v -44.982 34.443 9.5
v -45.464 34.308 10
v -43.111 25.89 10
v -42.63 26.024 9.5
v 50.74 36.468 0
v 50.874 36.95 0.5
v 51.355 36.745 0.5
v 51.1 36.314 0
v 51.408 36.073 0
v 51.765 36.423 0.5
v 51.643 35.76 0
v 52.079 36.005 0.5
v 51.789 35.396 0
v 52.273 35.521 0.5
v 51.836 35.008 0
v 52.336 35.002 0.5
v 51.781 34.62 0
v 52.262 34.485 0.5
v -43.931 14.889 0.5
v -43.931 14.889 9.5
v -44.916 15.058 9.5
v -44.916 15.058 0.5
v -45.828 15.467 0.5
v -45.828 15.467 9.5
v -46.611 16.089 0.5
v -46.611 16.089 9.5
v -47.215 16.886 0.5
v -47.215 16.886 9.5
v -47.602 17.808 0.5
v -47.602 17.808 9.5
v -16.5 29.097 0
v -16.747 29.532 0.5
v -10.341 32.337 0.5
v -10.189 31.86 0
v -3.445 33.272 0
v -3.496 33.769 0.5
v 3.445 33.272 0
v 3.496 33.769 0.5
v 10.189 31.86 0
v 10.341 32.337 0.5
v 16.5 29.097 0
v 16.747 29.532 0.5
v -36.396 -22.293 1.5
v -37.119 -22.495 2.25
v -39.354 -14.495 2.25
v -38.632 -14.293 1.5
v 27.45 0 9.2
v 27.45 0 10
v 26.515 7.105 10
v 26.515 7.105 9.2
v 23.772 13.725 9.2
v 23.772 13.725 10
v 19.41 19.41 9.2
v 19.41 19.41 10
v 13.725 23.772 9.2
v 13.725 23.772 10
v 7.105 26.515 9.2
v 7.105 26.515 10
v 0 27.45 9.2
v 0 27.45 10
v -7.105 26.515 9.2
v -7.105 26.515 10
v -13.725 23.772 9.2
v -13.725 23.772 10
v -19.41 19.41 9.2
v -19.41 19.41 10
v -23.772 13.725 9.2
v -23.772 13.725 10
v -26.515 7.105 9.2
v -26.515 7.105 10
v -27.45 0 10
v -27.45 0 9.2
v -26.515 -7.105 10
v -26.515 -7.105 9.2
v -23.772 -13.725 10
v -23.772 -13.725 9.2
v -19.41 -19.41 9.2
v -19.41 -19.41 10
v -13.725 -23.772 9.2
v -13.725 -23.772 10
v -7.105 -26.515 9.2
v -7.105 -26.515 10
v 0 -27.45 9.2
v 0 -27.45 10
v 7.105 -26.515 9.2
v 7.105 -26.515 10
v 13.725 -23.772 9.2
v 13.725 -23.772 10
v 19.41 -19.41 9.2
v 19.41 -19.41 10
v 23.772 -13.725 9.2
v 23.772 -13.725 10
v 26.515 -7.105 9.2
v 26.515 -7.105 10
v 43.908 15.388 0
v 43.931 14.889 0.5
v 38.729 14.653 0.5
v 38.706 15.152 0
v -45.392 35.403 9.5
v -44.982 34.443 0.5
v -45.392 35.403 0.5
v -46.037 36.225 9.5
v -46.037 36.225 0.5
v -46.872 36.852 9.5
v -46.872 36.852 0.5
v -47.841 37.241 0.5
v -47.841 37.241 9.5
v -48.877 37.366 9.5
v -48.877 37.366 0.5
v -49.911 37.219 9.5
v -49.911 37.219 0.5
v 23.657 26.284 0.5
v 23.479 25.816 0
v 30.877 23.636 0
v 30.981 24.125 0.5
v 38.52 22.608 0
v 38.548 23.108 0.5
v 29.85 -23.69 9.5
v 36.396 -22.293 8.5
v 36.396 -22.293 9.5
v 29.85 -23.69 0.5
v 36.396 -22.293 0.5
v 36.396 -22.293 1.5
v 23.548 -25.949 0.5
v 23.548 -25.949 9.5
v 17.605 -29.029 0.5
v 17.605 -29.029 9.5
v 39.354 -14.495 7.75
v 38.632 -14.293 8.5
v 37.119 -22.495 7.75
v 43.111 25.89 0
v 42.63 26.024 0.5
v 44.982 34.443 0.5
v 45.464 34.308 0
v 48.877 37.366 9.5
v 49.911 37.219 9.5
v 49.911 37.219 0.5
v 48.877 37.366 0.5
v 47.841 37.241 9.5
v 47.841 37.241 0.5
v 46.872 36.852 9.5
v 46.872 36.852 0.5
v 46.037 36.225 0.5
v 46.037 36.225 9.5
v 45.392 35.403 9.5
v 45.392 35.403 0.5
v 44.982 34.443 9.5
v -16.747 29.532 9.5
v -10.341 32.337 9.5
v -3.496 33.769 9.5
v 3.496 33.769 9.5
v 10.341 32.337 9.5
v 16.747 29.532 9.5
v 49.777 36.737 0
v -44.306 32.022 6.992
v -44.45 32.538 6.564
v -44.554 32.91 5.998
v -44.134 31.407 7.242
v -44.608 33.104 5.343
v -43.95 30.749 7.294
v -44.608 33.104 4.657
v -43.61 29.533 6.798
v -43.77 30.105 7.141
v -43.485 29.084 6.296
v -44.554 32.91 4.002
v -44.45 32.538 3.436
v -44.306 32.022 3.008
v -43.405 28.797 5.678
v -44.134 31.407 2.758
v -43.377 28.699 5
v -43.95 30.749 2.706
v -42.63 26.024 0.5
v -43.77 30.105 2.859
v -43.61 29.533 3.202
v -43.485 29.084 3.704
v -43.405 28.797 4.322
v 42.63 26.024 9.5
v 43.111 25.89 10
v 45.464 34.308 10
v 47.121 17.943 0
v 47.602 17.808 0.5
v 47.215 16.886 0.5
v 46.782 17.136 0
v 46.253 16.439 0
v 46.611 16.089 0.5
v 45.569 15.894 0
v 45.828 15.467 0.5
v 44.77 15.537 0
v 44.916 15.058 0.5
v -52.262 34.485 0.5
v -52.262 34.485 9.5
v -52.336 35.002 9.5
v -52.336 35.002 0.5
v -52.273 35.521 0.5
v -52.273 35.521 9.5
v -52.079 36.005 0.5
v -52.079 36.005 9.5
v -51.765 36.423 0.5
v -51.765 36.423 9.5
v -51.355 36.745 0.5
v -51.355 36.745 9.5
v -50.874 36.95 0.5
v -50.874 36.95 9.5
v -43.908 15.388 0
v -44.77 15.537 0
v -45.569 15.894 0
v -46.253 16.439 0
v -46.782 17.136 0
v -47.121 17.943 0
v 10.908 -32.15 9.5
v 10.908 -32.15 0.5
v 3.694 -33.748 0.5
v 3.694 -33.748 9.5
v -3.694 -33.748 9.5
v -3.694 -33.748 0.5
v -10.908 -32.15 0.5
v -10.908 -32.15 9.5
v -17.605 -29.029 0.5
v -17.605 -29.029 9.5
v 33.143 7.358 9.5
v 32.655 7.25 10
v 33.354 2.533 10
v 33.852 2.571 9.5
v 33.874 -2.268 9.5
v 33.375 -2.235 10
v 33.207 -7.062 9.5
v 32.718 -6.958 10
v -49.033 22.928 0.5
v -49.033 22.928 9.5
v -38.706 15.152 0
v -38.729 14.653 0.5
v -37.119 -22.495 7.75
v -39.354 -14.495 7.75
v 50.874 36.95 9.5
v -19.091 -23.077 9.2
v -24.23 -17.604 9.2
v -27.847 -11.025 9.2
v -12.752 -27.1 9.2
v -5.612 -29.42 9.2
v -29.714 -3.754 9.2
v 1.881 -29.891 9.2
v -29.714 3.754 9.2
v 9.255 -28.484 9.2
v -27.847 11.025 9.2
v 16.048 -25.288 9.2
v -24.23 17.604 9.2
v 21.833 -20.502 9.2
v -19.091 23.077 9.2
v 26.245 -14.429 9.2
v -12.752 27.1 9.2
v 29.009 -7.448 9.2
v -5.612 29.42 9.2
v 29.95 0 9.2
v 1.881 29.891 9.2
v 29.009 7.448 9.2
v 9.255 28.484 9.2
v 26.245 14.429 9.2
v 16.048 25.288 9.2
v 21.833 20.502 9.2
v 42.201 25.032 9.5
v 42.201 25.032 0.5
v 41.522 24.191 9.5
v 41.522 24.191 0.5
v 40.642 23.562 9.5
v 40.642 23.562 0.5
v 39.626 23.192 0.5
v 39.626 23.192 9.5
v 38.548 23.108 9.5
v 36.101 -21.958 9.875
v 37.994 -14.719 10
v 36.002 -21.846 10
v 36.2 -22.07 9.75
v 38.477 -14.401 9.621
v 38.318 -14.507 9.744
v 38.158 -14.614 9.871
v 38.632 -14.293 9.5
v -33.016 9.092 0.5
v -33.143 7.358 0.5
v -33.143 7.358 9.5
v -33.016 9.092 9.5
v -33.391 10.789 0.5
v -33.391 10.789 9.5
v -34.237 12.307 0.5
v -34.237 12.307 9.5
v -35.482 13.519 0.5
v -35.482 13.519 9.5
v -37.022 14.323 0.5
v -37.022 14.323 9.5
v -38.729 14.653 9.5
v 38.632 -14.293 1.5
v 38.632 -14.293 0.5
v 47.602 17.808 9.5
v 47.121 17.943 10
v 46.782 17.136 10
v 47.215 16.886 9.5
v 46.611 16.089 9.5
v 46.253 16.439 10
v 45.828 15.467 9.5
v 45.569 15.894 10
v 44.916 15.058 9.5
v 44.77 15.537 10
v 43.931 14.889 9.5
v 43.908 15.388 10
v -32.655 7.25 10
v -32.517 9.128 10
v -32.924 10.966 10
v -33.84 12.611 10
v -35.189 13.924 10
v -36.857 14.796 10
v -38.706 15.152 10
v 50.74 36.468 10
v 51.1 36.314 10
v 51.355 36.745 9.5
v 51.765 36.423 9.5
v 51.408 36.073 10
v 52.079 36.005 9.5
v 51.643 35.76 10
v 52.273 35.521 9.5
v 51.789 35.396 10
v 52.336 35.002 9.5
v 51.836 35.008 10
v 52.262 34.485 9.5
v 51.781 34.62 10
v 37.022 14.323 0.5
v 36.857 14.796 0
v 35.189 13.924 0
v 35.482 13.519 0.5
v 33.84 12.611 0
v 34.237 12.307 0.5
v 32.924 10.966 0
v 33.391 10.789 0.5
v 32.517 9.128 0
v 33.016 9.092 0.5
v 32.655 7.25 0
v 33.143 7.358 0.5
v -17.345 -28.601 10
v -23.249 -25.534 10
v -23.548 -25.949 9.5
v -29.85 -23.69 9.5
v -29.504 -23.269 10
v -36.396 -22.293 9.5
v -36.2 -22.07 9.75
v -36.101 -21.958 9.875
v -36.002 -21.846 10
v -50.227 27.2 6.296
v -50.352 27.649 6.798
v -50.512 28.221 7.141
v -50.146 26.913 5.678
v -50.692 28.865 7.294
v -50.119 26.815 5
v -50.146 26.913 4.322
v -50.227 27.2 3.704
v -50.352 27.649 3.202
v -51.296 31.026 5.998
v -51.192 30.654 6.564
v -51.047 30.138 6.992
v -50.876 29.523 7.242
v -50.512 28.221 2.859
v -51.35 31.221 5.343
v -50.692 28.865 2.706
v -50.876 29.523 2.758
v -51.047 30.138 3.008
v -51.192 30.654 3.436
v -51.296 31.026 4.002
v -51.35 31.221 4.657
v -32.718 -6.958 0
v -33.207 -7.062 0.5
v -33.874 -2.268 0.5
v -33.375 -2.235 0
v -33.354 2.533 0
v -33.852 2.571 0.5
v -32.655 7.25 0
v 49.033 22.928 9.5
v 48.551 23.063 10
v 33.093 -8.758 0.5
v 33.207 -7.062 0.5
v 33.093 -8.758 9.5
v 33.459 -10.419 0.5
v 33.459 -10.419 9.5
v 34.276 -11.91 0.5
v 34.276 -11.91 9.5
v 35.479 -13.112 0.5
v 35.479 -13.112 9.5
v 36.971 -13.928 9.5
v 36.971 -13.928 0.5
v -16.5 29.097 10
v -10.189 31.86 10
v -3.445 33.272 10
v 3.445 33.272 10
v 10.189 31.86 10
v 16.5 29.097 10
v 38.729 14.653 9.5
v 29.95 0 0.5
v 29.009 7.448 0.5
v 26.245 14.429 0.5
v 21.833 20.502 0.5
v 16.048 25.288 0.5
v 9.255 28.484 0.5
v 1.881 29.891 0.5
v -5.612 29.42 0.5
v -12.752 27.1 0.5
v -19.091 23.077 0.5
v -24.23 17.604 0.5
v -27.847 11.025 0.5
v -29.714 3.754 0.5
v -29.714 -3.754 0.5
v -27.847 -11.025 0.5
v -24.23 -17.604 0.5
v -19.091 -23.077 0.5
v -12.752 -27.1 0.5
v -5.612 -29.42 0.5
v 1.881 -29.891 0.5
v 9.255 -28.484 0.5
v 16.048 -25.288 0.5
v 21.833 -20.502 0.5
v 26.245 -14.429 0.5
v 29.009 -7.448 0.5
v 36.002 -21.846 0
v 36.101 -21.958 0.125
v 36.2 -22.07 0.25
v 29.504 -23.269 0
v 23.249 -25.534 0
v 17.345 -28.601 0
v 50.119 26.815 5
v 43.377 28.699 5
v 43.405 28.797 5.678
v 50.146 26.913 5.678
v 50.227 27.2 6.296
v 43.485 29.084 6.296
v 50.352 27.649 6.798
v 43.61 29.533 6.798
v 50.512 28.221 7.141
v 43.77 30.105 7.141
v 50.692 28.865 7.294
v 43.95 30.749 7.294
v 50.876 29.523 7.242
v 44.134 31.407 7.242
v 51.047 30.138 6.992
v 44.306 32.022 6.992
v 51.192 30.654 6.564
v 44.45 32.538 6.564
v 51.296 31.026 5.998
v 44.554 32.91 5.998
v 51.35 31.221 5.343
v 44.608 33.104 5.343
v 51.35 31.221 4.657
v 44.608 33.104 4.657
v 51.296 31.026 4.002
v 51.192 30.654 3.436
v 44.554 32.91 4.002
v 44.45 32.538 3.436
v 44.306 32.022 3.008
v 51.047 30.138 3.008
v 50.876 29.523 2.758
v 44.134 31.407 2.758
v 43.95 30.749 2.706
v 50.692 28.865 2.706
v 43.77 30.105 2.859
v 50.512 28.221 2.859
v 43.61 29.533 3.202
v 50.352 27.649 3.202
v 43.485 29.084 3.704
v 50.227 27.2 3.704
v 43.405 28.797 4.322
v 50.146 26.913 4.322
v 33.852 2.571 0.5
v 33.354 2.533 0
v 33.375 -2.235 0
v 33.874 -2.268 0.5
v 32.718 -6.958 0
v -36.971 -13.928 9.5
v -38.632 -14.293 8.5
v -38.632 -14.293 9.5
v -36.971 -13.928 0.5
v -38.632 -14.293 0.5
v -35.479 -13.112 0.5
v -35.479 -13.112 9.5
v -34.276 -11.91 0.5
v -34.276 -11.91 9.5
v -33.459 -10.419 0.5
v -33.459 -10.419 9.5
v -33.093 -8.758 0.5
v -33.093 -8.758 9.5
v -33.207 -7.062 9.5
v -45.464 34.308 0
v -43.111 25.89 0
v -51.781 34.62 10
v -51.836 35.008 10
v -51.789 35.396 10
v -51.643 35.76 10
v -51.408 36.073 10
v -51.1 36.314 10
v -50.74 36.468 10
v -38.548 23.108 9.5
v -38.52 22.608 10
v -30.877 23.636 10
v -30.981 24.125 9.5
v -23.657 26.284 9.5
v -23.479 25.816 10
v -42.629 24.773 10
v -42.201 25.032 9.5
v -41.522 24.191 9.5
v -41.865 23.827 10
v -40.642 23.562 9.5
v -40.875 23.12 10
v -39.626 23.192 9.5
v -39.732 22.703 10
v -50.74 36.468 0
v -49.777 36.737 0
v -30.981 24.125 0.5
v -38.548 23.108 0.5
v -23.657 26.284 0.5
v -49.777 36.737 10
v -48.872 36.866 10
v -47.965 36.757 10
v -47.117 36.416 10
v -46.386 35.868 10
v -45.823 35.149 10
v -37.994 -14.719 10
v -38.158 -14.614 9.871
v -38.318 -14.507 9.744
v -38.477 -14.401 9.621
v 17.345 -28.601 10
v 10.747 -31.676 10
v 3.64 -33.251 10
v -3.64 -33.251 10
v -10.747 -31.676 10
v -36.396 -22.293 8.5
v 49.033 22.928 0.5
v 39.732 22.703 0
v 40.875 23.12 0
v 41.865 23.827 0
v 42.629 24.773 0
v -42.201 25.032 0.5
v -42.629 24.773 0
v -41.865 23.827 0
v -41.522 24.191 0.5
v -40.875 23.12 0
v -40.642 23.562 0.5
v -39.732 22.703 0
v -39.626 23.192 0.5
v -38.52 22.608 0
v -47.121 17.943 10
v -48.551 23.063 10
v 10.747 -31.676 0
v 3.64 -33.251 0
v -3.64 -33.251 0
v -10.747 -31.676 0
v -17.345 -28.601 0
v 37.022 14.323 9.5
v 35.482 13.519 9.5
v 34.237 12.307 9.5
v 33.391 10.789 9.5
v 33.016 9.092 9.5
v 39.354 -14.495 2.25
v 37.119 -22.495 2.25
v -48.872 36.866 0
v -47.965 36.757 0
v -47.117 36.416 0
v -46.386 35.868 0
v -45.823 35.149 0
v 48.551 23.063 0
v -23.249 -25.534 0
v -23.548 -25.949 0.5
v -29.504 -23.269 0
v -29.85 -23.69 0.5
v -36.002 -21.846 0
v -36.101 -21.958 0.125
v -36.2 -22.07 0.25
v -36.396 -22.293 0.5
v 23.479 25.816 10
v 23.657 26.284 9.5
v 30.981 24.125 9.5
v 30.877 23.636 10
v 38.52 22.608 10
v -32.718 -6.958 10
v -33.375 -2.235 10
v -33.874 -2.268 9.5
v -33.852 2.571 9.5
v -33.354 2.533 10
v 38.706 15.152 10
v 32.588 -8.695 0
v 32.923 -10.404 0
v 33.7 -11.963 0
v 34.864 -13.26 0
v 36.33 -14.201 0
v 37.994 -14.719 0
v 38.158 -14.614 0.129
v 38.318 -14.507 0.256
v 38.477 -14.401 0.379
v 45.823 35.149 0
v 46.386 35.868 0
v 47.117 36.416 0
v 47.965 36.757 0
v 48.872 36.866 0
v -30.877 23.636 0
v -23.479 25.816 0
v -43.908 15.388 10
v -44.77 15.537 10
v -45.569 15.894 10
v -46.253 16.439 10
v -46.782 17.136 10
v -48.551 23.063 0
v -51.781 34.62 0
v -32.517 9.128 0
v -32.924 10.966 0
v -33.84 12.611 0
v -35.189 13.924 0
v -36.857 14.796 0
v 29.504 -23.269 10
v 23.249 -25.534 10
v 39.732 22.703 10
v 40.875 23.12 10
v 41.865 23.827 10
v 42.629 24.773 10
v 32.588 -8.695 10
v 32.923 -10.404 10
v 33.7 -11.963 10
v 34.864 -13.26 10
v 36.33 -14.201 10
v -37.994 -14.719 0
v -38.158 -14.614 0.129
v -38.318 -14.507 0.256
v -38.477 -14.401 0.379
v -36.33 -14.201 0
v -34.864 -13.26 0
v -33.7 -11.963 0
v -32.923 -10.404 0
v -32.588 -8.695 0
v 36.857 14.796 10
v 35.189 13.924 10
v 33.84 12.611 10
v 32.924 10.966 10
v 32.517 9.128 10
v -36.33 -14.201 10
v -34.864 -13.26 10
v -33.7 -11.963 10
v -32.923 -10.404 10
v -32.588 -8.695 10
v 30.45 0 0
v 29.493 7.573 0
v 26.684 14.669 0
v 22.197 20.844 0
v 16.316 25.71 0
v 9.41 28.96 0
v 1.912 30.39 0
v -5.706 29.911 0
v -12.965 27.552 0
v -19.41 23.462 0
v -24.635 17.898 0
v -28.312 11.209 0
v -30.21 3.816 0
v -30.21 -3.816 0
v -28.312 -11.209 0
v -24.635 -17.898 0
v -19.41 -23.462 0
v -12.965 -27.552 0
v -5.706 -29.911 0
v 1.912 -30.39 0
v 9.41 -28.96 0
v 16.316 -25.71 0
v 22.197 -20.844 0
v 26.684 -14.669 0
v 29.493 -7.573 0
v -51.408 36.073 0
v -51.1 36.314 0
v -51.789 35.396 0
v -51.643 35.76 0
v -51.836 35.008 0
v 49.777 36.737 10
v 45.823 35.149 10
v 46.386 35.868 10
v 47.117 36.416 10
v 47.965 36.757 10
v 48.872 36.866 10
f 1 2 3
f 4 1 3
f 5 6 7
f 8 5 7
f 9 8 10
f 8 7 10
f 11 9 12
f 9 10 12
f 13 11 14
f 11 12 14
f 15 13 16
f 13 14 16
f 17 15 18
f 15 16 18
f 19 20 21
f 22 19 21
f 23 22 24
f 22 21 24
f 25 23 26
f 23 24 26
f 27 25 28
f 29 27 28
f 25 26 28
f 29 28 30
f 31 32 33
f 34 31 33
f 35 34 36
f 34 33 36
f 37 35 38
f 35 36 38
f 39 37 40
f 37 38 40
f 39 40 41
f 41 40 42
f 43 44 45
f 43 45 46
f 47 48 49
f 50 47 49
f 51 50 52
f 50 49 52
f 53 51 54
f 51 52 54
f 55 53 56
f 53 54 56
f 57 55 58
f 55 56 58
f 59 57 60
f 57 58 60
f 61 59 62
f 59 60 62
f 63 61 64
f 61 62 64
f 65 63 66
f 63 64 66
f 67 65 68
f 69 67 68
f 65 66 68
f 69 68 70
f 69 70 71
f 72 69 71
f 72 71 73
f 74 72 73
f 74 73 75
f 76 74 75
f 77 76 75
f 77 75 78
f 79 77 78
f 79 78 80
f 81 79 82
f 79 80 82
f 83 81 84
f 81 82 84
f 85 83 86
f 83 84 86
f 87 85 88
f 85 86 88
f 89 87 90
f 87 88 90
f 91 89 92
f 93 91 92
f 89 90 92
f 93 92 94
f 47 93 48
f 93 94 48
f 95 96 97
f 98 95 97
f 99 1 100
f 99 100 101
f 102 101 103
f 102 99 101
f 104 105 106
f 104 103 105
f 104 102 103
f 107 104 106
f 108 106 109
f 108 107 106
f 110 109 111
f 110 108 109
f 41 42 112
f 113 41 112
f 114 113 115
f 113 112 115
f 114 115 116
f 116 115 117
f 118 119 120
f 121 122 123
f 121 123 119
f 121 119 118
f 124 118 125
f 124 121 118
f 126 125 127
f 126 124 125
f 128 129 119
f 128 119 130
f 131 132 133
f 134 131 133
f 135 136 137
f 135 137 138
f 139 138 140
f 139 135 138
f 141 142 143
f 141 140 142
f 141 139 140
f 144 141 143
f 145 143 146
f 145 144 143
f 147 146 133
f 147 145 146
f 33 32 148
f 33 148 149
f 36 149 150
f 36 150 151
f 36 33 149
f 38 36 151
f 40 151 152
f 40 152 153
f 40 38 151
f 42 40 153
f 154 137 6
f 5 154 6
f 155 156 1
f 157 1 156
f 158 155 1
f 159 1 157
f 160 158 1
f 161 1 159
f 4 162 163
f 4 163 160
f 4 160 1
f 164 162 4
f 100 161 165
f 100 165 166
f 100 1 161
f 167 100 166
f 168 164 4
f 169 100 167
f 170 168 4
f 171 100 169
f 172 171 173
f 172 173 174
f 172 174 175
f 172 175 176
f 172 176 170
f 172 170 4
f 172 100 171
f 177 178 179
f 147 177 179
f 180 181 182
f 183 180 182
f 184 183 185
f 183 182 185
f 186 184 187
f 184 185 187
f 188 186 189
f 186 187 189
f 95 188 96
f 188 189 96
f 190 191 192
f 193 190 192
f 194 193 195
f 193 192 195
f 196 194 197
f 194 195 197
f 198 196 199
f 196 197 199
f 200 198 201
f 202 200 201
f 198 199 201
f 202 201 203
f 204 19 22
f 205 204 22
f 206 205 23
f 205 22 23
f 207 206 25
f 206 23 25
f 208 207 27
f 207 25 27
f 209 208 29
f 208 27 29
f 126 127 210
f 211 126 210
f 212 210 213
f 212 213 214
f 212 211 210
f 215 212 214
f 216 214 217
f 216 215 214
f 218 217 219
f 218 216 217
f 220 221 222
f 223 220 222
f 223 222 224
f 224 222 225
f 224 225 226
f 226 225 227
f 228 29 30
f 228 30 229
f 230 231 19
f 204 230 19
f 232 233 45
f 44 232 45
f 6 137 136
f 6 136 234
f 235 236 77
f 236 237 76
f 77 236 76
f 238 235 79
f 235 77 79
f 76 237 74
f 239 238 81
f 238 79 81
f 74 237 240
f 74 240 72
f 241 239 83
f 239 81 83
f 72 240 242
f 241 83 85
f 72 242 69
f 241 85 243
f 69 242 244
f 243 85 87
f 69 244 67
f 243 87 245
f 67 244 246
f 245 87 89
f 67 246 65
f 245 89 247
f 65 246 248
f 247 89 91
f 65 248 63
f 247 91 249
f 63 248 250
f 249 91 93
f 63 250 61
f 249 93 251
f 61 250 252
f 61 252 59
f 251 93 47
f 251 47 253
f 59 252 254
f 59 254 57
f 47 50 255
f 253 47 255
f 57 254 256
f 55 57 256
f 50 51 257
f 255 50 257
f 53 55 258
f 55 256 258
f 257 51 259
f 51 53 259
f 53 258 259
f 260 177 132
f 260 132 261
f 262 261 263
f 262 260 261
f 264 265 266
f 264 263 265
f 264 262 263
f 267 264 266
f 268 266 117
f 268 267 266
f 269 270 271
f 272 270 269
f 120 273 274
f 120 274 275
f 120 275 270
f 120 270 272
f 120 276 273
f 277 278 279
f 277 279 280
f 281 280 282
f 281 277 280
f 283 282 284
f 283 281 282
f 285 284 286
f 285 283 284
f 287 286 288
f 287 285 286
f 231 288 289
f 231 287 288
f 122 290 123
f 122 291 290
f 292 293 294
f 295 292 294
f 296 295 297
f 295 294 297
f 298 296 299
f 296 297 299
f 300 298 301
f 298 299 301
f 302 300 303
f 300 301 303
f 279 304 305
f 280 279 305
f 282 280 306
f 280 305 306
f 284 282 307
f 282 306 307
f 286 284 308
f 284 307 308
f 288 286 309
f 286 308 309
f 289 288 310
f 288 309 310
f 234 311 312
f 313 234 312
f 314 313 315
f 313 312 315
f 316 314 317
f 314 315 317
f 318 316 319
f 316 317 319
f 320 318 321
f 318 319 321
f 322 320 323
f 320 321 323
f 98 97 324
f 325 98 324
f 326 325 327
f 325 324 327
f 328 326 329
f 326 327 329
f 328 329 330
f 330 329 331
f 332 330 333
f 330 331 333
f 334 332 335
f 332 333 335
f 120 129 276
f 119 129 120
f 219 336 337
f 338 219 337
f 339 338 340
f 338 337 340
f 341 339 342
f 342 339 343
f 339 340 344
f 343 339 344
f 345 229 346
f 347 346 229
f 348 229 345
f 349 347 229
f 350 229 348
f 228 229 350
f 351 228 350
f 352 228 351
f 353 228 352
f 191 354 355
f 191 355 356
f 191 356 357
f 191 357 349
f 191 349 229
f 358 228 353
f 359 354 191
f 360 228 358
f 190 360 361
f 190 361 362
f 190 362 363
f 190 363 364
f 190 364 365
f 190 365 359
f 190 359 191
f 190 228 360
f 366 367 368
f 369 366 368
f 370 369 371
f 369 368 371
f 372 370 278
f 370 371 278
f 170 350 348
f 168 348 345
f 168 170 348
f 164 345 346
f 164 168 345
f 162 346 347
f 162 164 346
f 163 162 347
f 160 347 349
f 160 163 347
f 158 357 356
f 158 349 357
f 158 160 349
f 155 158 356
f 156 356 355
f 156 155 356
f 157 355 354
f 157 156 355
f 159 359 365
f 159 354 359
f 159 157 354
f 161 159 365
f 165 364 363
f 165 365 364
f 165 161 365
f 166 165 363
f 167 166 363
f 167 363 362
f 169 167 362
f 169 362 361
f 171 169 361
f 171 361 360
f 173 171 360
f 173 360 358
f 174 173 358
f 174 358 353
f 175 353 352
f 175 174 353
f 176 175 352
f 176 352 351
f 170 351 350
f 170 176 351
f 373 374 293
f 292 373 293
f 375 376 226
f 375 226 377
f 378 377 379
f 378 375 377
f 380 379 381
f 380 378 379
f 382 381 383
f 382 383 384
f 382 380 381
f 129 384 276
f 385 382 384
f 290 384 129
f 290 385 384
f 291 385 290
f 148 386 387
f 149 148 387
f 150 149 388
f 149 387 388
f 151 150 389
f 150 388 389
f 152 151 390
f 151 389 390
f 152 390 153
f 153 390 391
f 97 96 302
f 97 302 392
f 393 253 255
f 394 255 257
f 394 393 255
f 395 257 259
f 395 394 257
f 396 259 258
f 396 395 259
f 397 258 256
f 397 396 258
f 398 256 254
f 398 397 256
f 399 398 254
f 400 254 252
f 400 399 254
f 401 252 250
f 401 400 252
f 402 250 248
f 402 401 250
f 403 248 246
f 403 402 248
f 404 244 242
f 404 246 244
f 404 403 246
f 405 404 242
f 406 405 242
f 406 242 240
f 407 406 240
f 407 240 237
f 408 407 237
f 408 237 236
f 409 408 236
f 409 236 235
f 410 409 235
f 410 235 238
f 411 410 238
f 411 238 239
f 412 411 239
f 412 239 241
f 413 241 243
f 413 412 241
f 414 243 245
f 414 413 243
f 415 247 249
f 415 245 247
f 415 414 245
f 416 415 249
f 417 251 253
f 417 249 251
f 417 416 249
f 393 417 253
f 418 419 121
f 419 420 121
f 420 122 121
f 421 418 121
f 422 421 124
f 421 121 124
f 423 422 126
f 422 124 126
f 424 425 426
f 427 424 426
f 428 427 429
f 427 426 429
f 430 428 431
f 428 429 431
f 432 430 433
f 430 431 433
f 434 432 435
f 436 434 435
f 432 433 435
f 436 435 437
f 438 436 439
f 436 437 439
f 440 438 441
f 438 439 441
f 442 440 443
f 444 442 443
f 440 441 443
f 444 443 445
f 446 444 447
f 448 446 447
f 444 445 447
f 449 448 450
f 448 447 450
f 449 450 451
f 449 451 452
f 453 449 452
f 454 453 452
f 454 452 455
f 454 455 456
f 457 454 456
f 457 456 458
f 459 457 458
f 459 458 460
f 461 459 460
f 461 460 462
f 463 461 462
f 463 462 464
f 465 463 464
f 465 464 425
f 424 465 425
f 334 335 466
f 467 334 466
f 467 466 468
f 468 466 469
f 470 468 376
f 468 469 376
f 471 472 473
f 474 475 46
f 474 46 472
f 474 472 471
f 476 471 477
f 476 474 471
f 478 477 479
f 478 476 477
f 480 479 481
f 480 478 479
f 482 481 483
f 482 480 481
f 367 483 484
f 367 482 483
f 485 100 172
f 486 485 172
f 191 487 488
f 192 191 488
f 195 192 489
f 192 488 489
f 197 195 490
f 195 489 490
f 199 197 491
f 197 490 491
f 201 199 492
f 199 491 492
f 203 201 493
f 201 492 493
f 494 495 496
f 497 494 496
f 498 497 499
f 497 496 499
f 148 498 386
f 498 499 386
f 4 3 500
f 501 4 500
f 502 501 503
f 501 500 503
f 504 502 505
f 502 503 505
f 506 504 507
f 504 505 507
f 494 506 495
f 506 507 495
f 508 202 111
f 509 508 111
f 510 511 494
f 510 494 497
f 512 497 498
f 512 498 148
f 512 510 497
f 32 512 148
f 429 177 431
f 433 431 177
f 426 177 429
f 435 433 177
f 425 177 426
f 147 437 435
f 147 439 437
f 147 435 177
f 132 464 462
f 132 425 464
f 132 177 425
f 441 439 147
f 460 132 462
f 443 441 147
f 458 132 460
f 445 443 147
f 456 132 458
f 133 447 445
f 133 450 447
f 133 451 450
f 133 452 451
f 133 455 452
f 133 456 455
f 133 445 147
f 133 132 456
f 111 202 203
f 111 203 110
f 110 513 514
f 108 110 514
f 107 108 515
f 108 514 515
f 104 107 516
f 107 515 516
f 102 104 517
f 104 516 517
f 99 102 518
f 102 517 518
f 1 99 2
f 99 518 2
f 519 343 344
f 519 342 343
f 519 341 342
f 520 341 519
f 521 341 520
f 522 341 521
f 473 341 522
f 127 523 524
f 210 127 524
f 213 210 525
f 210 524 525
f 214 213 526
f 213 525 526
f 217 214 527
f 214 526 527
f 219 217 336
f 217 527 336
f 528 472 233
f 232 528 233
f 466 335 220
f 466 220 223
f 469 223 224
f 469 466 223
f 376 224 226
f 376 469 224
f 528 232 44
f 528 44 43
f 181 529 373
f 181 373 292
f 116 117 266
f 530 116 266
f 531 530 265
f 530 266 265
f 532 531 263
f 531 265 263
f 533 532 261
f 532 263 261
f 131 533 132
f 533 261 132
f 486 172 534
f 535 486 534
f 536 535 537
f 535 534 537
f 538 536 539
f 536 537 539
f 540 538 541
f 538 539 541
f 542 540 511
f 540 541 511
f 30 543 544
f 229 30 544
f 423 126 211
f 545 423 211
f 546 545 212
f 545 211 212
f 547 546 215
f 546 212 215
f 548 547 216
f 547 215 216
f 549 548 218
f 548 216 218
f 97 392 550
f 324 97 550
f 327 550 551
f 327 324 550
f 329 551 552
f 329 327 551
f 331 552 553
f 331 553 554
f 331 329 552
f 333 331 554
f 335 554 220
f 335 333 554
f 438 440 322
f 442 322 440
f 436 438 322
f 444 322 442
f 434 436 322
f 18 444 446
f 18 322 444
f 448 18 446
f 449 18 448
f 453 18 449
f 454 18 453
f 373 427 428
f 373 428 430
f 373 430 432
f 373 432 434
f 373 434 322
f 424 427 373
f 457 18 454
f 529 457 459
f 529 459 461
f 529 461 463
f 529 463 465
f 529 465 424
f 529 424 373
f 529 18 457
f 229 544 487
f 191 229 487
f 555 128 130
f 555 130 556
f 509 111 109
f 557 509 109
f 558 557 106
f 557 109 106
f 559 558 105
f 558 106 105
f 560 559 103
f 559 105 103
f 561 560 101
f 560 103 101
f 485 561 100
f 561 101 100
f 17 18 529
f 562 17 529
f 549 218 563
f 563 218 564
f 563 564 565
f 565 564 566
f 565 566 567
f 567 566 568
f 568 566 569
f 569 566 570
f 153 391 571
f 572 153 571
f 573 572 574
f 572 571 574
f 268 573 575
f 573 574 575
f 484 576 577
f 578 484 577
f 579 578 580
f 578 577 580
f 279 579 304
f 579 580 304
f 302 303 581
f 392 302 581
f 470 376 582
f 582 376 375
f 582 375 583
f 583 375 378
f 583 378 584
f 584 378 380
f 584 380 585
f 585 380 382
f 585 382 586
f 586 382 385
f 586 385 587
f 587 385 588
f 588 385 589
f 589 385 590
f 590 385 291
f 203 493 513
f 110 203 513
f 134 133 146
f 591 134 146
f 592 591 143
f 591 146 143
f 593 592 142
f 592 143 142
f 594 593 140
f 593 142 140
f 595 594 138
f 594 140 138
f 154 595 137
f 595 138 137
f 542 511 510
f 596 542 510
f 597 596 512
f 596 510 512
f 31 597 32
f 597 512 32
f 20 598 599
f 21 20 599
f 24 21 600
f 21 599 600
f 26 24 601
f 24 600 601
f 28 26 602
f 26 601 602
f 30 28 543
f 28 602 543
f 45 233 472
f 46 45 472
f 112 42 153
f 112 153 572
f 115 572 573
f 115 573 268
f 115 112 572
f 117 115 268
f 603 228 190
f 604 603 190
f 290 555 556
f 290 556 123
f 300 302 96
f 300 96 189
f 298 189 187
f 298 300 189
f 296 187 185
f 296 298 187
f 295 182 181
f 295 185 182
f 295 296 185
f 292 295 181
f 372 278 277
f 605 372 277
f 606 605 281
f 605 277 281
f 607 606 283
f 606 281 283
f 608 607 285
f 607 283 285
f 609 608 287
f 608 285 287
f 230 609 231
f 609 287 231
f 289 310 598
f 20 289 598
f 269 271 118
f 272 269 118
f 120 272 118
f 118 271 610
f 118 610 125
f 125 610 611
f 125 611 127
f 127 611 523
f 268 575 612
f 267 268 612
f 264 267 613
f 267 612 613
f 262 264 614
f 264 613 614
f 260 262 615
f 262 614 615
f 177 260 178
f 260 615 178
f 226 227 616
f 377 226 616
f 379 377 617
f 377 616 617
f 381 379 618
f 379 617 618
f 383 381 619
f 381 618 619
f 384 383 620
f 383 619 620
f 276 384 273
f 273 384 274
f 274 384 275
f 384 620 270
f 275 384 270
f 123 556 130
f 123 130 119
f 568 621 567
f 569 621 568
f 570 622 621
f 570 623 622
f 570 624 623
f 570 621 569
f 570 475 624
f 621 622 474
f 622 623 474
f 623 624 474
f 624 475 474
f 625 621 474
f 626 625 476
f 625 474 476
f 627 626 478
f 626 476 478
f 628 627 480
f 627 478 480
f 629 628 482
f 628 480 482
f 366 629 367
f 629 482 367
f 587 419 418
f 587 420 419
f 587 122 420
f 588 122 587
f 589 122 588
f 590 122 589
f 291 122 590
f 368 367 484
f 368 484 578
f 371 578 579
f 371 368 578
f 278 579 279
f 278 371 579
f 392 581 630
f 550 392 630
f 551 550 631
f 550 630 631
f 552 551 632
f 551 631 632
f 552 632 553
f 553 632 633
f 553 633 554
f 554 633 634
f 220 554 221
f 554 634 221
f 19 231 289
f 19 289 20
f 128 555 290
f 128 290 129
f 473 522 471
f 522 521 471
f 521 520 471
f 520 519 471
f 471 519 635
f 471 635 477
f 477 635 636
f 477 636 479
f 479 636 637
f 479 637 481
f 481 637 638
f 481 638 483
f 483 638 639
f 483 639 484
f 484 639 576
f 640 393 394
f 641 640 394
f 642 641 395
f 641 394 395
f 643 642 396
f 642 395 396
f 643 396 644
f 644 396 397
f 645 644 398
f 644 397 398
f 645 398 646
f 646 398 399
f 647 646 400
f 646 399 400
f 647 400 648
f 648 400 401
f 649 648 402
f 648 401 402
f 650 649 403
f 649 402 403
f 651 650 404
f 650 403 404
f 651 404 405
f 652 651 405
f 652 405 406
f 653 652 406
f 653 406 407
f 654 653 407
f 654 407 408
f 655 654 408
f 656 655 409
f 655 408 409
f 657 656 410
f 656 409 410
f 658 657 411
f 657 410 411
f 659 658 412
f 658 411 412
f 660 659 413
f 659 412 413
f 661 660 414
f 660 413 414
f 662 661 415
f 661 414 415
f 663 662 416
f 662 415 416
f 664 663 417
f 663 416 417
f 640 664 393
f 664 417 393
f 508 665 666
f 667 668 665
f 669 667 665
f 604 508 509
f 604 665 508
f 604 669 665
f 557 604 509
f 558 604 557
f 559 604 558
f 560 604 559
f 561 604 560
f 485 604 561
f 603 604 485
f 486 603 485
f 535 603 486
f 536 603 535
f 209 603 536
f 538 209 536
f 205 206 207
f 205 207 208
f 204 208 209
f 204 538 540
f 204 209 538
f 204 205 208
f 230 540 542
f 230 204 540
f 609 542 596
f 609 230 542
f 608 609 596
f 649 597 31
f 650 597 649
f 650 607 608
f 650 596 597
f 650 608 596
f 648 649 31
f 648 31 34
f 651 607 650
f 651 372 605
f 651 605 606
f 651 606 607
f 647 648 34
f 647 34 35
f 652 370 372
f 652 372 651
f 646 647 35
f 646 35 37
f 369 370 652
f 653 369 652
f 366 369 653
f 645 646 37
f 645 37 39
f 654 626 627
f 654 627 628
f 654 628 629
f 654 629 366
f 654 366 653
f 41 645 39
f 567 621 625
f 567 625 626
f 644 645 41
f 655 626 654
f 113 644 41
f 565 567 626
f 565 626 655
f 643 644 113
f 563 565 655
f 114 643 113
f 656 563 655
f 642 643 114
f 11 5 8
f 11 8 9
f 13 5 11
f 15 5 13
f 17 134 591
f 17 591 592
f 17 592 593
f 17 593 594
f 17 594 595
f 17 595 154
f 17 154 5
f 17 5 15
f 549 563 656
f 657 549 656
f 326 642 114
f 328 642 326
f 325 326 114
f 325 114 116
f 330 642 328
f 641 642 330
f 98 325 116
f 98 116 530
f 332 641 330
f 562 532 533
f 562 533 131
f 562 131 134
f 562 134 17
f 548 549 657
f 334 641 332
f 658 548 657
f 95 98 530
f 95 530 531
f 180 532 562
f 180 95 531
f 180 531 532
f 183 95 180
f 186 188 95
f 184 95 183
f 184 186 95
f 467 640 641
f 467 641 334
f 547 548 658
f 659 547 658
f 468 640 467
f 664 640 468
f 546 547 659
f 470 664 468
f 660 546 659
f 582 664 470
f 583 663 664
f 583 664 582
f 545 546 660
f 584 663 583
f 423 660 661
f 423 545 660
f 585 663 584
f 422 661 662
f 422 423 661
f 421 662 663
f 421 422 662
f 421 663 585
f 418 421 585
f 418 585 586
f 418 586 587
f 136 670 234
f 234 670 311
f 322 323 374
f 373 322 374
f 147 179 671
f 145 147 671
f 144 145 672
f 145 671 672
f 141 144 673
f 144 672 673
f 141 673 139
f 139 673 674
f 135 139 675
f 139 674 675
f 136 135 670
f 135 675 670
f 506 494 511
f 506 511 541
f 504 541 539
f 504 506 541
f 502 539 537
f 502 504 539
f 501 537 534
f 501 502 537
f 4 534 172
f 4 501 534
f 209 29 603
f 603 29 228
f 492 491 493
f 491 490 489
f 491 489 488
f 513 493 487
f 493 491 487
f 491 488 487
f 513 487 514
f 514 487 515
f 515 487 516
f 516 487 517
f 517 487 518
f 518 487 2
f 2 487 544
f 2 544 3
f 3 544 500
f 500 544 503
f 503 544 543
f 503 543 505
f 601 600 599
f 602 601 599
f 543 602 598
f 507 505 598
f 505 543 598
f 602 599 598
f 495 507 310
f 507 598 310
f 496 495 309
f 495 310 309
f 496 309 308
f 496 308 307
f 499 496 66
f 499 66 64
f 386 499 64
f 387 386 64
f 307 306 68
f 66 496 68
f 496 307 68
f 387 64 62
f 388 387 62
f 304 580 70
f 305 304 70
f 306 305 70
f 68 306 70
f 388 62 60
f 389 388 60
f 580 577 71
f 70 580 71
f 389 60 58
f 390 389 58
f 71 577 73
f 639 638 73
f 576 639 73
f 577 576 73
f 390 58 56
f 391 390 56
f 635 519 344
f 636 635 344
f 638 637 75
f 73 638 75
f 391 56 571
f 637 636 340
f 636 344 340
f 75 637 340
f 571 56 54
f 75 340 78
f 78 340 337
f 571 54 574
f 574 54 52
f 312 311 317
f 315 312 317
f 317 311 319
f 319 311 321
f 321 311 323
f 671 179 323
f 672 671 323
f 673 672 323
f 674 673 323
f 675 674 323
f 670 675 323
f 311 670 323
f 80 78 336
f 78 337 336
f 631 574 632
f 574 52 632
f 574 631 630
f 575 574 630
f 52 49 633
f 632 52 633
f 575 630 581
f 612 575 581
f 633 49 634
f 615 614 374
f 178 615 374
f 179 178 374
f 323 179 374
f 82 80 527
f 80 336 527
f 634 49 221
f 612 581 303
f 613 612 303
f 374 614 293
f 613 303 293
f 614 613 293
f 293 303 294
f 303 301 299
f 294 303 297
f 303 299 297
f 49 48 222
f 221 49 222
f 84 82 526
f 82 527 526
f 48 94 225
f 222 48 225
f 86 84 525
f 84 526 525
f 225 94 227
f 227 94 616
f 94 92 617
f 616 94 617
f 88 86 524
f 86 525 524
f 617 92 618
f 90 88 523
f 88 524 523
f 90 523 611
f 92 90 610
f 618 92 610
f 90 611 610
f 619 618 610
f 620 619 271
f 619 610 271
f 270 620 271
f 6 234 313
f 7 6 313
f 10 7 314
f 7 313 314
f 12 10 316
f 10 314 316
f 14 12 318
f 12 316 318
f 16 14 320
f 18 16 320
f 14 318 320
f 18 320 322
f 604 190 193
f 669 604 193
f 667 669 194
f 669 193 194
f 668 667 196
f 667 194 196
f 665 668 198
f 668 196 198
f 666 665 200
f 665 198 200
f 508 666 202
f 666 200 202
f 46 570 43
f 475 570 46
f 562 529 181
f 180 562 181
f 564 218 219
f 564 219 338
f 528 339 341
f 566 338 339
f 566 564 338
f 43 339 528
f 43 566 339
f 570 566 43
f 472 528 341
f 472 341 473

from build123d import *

# Parameters (mm, degrees)
SKIZZE1_R                       = 29.95
AUFSATZ_LINEAR_AUSTRAGEN1_DEPTH = 10
SKIZZE2_R                       = 32.75
SKIZZE2_R_2                     = 27.45
AUFSATZ_LINEAR_AUSTRAGEN2_DEPTH = 0.8
SKIZZE5_R                       = 2.3
SCHNITT_LINEAR_AUSTRAGEN1_DEPTH = 10
VERRUNDUNG1_R                   = 50
VERRUNDUNG2_R                   = 6
VERRUNDUNG3_R                   = 4
AUFSATZ_LINEAR_AUSTRAGEN3_DEPTH = 8.306468
FILLET1_R                       = 2
CHAMFER1_SIZE                   = 0.5


with BuildPart() as part:
    # Skizze1 → Aufsatz-Linear austragen1 (new body)
    with BuildSketch(Plane.XY):
        with BuildLine():
            Line((-25.605118216, -22.29305769), (-36.396367746, -22.29305769))
            Line((-36.396367746, -22.29305769), (-38.631857121, -14.29305769))
            Line((-38.631857121, -14.29305769), (-30.794658658, -14.29305769))
            ThreePointArc((-30.794658658, -14.29305769), (-33.95, 0), (-30.794658658, 14.29305769))
            Line((-30.794658658, 14.29305769), (-46.822915195, 15.019747505))
            Line((-46.822915195, 15.019747505), (-49.03277701, 22.928035825))
            Line((-49.03277701, 22.928035825), (-52.800545787, 36.411504164))
            Line((-52.800545787, 36.411504164), (-46.058811618, 38.295388553))
            Line((-46.058811618, 38.295388553), (-41.792257863, 23.026950955))
            Line((-41.792257863, 23.026950955), (-25.605118216, 22.29305769))
            ThreePointArc((-25.605118216, 22.29305769), (0, 33.95), (25.605118216, 22.29305769))
            Line((25.605118216, 22.29305769), (41.792257863, 23.026950955))
            Line((41.792257863, 23.026950955), (46.058811618, 38.295388553))
            Line((46.058811618, 38.295388553), (52.800545787, 36.411504164))
            Line((52.800545787, 36.411504164), (49.03277701, 22.928035825))
            Line((49.03277701, 22.928035825), (46.822915195, 15.019747505))
            Line((46.822915195, 15.019747505), (30.794658658, 14.29305769))
            ThreePointArc((30.794658658, 14.29305769), (33.95, 0), (30.794658658, -14.29305769))
            Line((30.794658658, -14.29305769), (38.631857121, -14.29305769))
            Line((38.631857121, -14.29305769), (36.396367746, -22.29305769))
            Line((36.396367746, -22.29305769), (25.605118216, -22.29305769))
            ThreePointArc((25.605118216, -22.29305769), (0, -33.95), (-25.605118216, -22.29305769))
        make_face()
        Circle(SKIZZE1_R, mode=Mode.SUBTRACT)
    extrude(amount=AUFSATZ_LINEAR_AUSTRAGEN1_DEPTH)

    # Skizze2 → Aufsatz-Linear austragen2 (add)
    with BuildSketch(Plane.XY.offset(10)):
        Circle(SKIZZE2_R)
        Circle(SKIZZE2_R_2, mode=Mode.SUBTRACT)
    extrude(amount=-AUFSATZ_LINEAR_AUSTRAGEN2_DEPTH)

    # Skizze5 → Schnitt-Linear austragen1 (cut)
    with BuildSketch(Plane(origin=(32.796772797, -9.164604643, 0), x_dir=(0, 0, 1), z_dir=(-0.9631048813334842, 0.2691263412444341, 0))):
        with Locations(Location((5, 41.61405755, 0), (0, 0, 270))):
            Circle(SKIZZE5_R)
    schnitt_linear_austragen1 = extrude(amount=-SCHNITT_LINEAR_AUSTRAGEN1_DEPTH, mode=Mode.SUBTRACT)

    # Spiegeln1: Schnitt-Linear austragen1 across plane
    add(schnitt_linear_austragen1.mirror(Plane(origin=(0, 0, 0), x_dir=(0, 0, 1), z_dir=(1, 0, 0))), mode=Mode.SUBTRACT)

    # Verrundung1
    # the kernel refuses this fillet: 50 mm, written as the material it adds along each edge
    with BuildSketch(Plane(origin=(-25.605118216, 22.29305769, 0), x_dir=(-0.9989738125947814, 0.045291519623947715, 0), z_dir=(0, 0, 1))) as verrundung1_piece_1:
        with BuildLine():
            CenterArc((18.087510266, -49.964502541), VERRUNDUNG1_R, 92.159120897, 29.993366161)
            Line((-8.521208788, -7.632764208), (-9.053383169, -6.786129441))
            ThreePointArc((-9.053383169, -6.786129441), (-4.604005024, -3.433010053), (-0.783167276, 0.621811079))
            Line((-0.783167276, 0.621811079), (0, 1))
            ThreePointArc((0, 1), (8.101883875, 1), (16.1660929, 0.999290051))
            Line((16.1660929, 0.999290051), (16.20376775, 0))
        make_face()
    extrude(amount=10)
    with BuildSketch(Plane(origin=(25.605118216, 22.29305769, 0), x_dir=(-0.7743254156963487, 0.6327876030760059, 0), z_dir=(0, 0, 1))) as verrundung1_piece_2:
        with BuildLine():
            CenterArc((19.863886687, -49.285246753), VERRUNDUNG1_R, 99.699501479, 29.993366161)
            Line((-12.069715077, -10.811293506), (-12.708387112, -10.041814441))
            ThreePointArc((-12.708387112, -10.041814441), (-6.702066157, -4.660775852), (-0.667208619, 0.744870901))
            Line((-0.667208619, 0.744870901), (0.168480803, 0.985704935))
            ThreePointArc((0.168480803, 0.985704935), (5.719923266, 0.514682545), (11.271365728, 0.985704935))
            Line((11.271365728, 0.985704935), (11.439846531, 0))
        make_face()
    extrude(amount=10)
    with BuildSketch(Plane(origin=(-25.605118216, -22.29305769, 0), x_dir=(-1, 0, 0), z_dir=(0, 0, 1))) as verrundung1_piece_3:
        with BuildLine():
            CenterArc((17.927143088, 49.488170537), VERRUNDUNG1_R, 238.764970405, 23.029881184)
            Line((-8.000350244, 6.735801135), (-8.51890011, 5.880753747))
            ThreePointArc((-8.51890011, 5.880753747), (-4.38330809, 2.912839933), (-0.754200831, -0.65664382))
            Line((-0.754200831, -0.65664382), (0, -1))
            ThreePointArc((0, -1), (5.395624765, -1), (10.648531659, -0.989763411))
            Line((10.648531659, -0.989763411), (10.79124953, 0))
        make_face()
    extrude(amount=10)
    with BuildSketch(Plane(origin=(25.605118216, -22.29305769, 0), x_dir=(-0.7649741312009661, -0.6440610053351523, 0), z_dir=(0, 0, 1))) as verrundung1_piece_4:
        with BuildLine():
            CenterArc((18.15960016, 49.403344062), VERRUNDUNG1_R, 238.109839077, 23.029881184)
            Line((-8.255026734, 6.950223021), (-8.783319272, 6.1011606))
            ThreePointArc((-8.783319272, 6.1011606), (-4.771574372, 2.710137379), (-0.644061005, -0.764974131))
            Line((-0.644061005, -0.764974131), (0.154025447, -0.988066881))
            ThreePointArc((0.154025447, -0.988066881), (5.229163914, -0.594870618), (10.304302381, -0.988066881))
            Line((10.304302381, -0.988066881), (10.458327827, 0))
        make_face()
    extrude(amount=10)

    # Verrundung2
    # the kernel refuses this fillet: 6 mm, written as the material it adds along each edge
    with BuildSketch(Plane(origin=(-30.794658658, -14.29305769, 0), x_dir=(-0.31650196905899364, 0.9485918530020063, 0), z_dir=(0, 0, 1))) as verrundung2_piece_1_section:
        with BuildLine():
            CenterArc((8.297060958, 5.962063603), VERRUNDUNG2_R, 165.796112126, 97.757459861)
            Line((2.480488745, 7.434302612), (2.364157301, 7.463747393))
            ThreePointArc((2.364157301, 7.463747393), (1.12641335, 3.755131543), (-0.113831022, 0.037980236))
            Line((-0.113831022, 0.037980236), (0.0134729, -0.119241272))
            ThreePointArc((0.0134729, -0.119241272), (3.811707977, 0.094656778), (7.609943054, -0.119241272))
            Line((7.609943054, -0.119241272), (7.623415954, 0))
        make_face()
    verrundung2_piece_1 = extrude(amount=10, mode=Mode.PRIVATE)
    verrundung2_piece_1 = split(verrundung2_piece_1, bisect_by=Plane(origin=(-38.694932937, -14.067332385, 5), z_dir=(0.9631048813334845, 0.2691263412444326, 0)), keep=Keep.TOP, mode=Mode.PRIVATE)
    add(verrundung2_piece_1)
    with BuildSketch(Plane(origin=(30.794658658, -14.29305769, 0), x_dir=(1, 0, 0), z_dir=(0, 0, 1))) as verrundung2_piece_2_section:
        with BuildLine():
            CenterArc((8.281601092, 5.983519558), VERRUNDUNG2_R, 167.994917884, 97.757459861)
            Line((2.412826161, 7.231510266), (2.295450662, 7.256470081))
            ThreePointArc((2.295450662, 7.256470081), (1.296203729, 3.585796077), (-0.1088471, 0.050520381))
            Line((-0.1088471, 0.050520381), (0, -0.12))
            ThreePointArc((0, -0.12), (3.918599232, -0.12), (7.828310411, -0.119670391))
            Line((7.828310411, -0.119670391), (7.837198463, 0))
        make_face()
    verrundung2_piece_2 = extrude(amount=10, mode=Mode.PRIVATE)
    verrundung2_piece_2 = split(verrundung2_piece_2, bisect_by=Plane(origin=(38.694932937, -14.067332385, 5), z_dir=(-0.9631048813334845, 0.2691263412444326, 0)), keep=Keep.TOP, mode=Mode.PRIVATE)
    add(verrundung2_piece_2)
    with BuildSketch(Plane(origin=(30.794658658, 14.29305769, 0), x_dir=(0.320743613458383, -0.9471660543039216, 0), z_dir=(0, 0, 1))) as verrundung2_piece_3:
        with BuildLine():
            CenterArc((7.9683768, 5.965018375), VERRUNDUNG2_R, 163.887999515, 99.921963772)
            Line((2.204050499, 7.630113658), (2.088763973, 7.663415564))
            Line((2.088763973, 7.663415564), (-0.115286526, 0.033301906))
            Line((-0.115286526, 0.033301906), (0.012939177, -0.119300368))
            ThreePointArc((0.012939177, -0.119300368), (3.660708963, 0.077937694), (7.308478748, -0.119300368))
            Line((7.308478748, -0.119300368), (7.321417925, 0))
        make_face()
    extrude(amount=10)
    with BuildSketch(Plane(origin=(-30.794658658, 14.29305769, 0), x_dir=(-0.9989738125947842, 0.045291519623885015, 0), z_dir=(0, 0, 1))) as verrundung2_piece_4:
        with BuildLine():
            CenterArc((7.942069821, 6), VERRUNDUNG2_R, 170.078036228, 99.921963772)
            Line((2.031809742, 7.033840317), (1.91360454, 7.054517124))
            ThreePointArc((1.91360454, 7.054517124), (1.090781254, 3.495291211), (-0.111023547, 0.045538687))
            Line((-0.111023547, 0.045538687), (0, -0.12))
            Line((0, -0.12), (7.942069821, -0.12))
            Line((7.942069821, -0.12), (7.942069821, 0))
        make_face()
    extrude(amount=10)

    # Verrundung3
    verrundung3_edges = [part.edges().sort_by_distance(p)[0] for p in [
        (41.792257863, 23.026950955, 5),
        (46.058811618, 38.295388553, 5),
        (46.822915195, 15.019747505, 5),
        (-46.822915195, 15.019747505, 5),
        (-46.058811618, 38.295388553, 5),
        (-41.792257863, 23.026950955, 5),
    ]]
    fillet(verrundung3_edges, radius=VERRUNDUNG3_R)

    # Skizze6 → Aufsatz-Linear austragen3 (add)
    with BuildSketch(Plane(origin=(3.142139221, -11.244568658, 0), x_dir=(0, 0, -1), z_dir=(-0.26912634124443263, 0.9631048813334845, 0))):
        Polygon((-8.5, 41.05316849), (-7.75, 41.80316849), (-2.25, 41.80316849), (-1.5, 41.05316849), align=None)
    aufsatz_linear_austragen3 = extrude(amount=AUFSATZ_LINEAR_AUSTRAGEN3_DEPTH)

    # Mirror1: Aufsatz-Linear austragen3 across plane
    add(aufsatz_linear_austragen3.mirror(Plane(origin=(0, 0, 0), x_dir=(0, 0, 1), z_dir=(1, 0, 0))))

    # Fillet1
    fillet1_edges = [part.edges().sort_by_distance(p)[0] for p in [
        (52.800545787, 36.411504164, 5),
        (-52.800545787, 36.411504164, 5),
    ]]
    fillet(fillet1_edges, radius=FILLET1_R)

    # Chamfer1
    chamfer1_edges = [part.edges().sort_by_distance(p)[0] for p in [
        (-33.949660085, 0.151921409, 0),
        (-33.949660085, 0.151921409, 10),
        (33.949660085, 0.151921409, 0),
        (33.949660085, 0.151921409, 10),
        (41.329691449, 14.77069548, 0),
        (41.329691449, 14.77069548, 10),
        (-34.27649539, -11.909852297, 0),
        (-34.27649539, -11.909852297, 10),
        (34.27649539, -11.909852297, 0),
        (34.27649539, -11.909852297, 10),
        (34.236583606, 12.306764188, 0),
        (34.236583606, 12.306764188, 10),
        (-34.236583606, 12.306764188, 0),
        (-34.236583606, 12.306764188, 10),
        (-41.329691449, 14.77069548, 0),
        (-41.329691449, 14.77069548, 10),
        (43.806086505, 30.233708145, 0),
        (49.932175512, 26.146654573, 0),
        (-50.392783584, 37.084320017, 0),
        (-43.806086505, 30.233708145, 0),
        (-27.277805641, 25.064576342, 0),
        (-46.871858051, 36.851739876, 0),
        (46.871858051, 36.851739876, 0),
        (46.239249313, 15.753731476, 0),
        (-46.239249313, 15.753731476, 0),
        (43.806086505, 30.233708145, 10),
        (27.277805641, 25.064576342, 10),
        (-43.806086505, 30.233708145, 10),
        (-50.392783584, 37.084320017, 10),
        (49.932175512, 26.146654573, 10),
        (-46.871858051, 36.851739876, 10),
        (46.871858051, 36.851739876, 10),
        (46.239249313, 15.753731476, 10),
        (-46.239249313, 15.753731476, 10),
        (41.103257504, 23.846631411, 0),
        (41.103257504, 23.846631411, 10),
        (-41.103257504, 23.846631411, 0),
        (-41.103257504, 23.846631411, 10),
        (-49.932175512, 26.146654573, 0),
        (-49.932175512, 26.146654573, 10),
        (50.392783584, 37.084320017, 0),
        (52.078721449, 36.004980947, 0),
        (-52.078721449, 36.004980947, 0),
        (50.392783584, 37.084320017, 10),
        (52.078721449, 36.004980947, 10),
        (-52.078721449, 36.004980947, 10),
        (37.514112433, -18.29305769, 0),
        (-37.514112433, -18.29305769, 0),
        (-37.514112433, -18.29305769, 10),
        (37.514112433, -18.29305769, 10),
        (-29.95, 0, 0),
        (0, -33.95, 0),
        (0, -33.95, 10),
        (0, 33.95, 0),
        (0, 33.95, 10),
        (-26.660994535, -24.713613484, 0),
        (-26.660994535, -24.713613484, 10),
        (26.660994535, -24.713613484, 0),
        (26.660994535, -24.713613484, 10),
        (-27.277805641, 25.064576342, 10),
        (27.277805641, 25.064576342, 0),
    ]]
    chamfer(chamfer1_edges, length=CHAMFER1_SIZE)


solid = part.part
